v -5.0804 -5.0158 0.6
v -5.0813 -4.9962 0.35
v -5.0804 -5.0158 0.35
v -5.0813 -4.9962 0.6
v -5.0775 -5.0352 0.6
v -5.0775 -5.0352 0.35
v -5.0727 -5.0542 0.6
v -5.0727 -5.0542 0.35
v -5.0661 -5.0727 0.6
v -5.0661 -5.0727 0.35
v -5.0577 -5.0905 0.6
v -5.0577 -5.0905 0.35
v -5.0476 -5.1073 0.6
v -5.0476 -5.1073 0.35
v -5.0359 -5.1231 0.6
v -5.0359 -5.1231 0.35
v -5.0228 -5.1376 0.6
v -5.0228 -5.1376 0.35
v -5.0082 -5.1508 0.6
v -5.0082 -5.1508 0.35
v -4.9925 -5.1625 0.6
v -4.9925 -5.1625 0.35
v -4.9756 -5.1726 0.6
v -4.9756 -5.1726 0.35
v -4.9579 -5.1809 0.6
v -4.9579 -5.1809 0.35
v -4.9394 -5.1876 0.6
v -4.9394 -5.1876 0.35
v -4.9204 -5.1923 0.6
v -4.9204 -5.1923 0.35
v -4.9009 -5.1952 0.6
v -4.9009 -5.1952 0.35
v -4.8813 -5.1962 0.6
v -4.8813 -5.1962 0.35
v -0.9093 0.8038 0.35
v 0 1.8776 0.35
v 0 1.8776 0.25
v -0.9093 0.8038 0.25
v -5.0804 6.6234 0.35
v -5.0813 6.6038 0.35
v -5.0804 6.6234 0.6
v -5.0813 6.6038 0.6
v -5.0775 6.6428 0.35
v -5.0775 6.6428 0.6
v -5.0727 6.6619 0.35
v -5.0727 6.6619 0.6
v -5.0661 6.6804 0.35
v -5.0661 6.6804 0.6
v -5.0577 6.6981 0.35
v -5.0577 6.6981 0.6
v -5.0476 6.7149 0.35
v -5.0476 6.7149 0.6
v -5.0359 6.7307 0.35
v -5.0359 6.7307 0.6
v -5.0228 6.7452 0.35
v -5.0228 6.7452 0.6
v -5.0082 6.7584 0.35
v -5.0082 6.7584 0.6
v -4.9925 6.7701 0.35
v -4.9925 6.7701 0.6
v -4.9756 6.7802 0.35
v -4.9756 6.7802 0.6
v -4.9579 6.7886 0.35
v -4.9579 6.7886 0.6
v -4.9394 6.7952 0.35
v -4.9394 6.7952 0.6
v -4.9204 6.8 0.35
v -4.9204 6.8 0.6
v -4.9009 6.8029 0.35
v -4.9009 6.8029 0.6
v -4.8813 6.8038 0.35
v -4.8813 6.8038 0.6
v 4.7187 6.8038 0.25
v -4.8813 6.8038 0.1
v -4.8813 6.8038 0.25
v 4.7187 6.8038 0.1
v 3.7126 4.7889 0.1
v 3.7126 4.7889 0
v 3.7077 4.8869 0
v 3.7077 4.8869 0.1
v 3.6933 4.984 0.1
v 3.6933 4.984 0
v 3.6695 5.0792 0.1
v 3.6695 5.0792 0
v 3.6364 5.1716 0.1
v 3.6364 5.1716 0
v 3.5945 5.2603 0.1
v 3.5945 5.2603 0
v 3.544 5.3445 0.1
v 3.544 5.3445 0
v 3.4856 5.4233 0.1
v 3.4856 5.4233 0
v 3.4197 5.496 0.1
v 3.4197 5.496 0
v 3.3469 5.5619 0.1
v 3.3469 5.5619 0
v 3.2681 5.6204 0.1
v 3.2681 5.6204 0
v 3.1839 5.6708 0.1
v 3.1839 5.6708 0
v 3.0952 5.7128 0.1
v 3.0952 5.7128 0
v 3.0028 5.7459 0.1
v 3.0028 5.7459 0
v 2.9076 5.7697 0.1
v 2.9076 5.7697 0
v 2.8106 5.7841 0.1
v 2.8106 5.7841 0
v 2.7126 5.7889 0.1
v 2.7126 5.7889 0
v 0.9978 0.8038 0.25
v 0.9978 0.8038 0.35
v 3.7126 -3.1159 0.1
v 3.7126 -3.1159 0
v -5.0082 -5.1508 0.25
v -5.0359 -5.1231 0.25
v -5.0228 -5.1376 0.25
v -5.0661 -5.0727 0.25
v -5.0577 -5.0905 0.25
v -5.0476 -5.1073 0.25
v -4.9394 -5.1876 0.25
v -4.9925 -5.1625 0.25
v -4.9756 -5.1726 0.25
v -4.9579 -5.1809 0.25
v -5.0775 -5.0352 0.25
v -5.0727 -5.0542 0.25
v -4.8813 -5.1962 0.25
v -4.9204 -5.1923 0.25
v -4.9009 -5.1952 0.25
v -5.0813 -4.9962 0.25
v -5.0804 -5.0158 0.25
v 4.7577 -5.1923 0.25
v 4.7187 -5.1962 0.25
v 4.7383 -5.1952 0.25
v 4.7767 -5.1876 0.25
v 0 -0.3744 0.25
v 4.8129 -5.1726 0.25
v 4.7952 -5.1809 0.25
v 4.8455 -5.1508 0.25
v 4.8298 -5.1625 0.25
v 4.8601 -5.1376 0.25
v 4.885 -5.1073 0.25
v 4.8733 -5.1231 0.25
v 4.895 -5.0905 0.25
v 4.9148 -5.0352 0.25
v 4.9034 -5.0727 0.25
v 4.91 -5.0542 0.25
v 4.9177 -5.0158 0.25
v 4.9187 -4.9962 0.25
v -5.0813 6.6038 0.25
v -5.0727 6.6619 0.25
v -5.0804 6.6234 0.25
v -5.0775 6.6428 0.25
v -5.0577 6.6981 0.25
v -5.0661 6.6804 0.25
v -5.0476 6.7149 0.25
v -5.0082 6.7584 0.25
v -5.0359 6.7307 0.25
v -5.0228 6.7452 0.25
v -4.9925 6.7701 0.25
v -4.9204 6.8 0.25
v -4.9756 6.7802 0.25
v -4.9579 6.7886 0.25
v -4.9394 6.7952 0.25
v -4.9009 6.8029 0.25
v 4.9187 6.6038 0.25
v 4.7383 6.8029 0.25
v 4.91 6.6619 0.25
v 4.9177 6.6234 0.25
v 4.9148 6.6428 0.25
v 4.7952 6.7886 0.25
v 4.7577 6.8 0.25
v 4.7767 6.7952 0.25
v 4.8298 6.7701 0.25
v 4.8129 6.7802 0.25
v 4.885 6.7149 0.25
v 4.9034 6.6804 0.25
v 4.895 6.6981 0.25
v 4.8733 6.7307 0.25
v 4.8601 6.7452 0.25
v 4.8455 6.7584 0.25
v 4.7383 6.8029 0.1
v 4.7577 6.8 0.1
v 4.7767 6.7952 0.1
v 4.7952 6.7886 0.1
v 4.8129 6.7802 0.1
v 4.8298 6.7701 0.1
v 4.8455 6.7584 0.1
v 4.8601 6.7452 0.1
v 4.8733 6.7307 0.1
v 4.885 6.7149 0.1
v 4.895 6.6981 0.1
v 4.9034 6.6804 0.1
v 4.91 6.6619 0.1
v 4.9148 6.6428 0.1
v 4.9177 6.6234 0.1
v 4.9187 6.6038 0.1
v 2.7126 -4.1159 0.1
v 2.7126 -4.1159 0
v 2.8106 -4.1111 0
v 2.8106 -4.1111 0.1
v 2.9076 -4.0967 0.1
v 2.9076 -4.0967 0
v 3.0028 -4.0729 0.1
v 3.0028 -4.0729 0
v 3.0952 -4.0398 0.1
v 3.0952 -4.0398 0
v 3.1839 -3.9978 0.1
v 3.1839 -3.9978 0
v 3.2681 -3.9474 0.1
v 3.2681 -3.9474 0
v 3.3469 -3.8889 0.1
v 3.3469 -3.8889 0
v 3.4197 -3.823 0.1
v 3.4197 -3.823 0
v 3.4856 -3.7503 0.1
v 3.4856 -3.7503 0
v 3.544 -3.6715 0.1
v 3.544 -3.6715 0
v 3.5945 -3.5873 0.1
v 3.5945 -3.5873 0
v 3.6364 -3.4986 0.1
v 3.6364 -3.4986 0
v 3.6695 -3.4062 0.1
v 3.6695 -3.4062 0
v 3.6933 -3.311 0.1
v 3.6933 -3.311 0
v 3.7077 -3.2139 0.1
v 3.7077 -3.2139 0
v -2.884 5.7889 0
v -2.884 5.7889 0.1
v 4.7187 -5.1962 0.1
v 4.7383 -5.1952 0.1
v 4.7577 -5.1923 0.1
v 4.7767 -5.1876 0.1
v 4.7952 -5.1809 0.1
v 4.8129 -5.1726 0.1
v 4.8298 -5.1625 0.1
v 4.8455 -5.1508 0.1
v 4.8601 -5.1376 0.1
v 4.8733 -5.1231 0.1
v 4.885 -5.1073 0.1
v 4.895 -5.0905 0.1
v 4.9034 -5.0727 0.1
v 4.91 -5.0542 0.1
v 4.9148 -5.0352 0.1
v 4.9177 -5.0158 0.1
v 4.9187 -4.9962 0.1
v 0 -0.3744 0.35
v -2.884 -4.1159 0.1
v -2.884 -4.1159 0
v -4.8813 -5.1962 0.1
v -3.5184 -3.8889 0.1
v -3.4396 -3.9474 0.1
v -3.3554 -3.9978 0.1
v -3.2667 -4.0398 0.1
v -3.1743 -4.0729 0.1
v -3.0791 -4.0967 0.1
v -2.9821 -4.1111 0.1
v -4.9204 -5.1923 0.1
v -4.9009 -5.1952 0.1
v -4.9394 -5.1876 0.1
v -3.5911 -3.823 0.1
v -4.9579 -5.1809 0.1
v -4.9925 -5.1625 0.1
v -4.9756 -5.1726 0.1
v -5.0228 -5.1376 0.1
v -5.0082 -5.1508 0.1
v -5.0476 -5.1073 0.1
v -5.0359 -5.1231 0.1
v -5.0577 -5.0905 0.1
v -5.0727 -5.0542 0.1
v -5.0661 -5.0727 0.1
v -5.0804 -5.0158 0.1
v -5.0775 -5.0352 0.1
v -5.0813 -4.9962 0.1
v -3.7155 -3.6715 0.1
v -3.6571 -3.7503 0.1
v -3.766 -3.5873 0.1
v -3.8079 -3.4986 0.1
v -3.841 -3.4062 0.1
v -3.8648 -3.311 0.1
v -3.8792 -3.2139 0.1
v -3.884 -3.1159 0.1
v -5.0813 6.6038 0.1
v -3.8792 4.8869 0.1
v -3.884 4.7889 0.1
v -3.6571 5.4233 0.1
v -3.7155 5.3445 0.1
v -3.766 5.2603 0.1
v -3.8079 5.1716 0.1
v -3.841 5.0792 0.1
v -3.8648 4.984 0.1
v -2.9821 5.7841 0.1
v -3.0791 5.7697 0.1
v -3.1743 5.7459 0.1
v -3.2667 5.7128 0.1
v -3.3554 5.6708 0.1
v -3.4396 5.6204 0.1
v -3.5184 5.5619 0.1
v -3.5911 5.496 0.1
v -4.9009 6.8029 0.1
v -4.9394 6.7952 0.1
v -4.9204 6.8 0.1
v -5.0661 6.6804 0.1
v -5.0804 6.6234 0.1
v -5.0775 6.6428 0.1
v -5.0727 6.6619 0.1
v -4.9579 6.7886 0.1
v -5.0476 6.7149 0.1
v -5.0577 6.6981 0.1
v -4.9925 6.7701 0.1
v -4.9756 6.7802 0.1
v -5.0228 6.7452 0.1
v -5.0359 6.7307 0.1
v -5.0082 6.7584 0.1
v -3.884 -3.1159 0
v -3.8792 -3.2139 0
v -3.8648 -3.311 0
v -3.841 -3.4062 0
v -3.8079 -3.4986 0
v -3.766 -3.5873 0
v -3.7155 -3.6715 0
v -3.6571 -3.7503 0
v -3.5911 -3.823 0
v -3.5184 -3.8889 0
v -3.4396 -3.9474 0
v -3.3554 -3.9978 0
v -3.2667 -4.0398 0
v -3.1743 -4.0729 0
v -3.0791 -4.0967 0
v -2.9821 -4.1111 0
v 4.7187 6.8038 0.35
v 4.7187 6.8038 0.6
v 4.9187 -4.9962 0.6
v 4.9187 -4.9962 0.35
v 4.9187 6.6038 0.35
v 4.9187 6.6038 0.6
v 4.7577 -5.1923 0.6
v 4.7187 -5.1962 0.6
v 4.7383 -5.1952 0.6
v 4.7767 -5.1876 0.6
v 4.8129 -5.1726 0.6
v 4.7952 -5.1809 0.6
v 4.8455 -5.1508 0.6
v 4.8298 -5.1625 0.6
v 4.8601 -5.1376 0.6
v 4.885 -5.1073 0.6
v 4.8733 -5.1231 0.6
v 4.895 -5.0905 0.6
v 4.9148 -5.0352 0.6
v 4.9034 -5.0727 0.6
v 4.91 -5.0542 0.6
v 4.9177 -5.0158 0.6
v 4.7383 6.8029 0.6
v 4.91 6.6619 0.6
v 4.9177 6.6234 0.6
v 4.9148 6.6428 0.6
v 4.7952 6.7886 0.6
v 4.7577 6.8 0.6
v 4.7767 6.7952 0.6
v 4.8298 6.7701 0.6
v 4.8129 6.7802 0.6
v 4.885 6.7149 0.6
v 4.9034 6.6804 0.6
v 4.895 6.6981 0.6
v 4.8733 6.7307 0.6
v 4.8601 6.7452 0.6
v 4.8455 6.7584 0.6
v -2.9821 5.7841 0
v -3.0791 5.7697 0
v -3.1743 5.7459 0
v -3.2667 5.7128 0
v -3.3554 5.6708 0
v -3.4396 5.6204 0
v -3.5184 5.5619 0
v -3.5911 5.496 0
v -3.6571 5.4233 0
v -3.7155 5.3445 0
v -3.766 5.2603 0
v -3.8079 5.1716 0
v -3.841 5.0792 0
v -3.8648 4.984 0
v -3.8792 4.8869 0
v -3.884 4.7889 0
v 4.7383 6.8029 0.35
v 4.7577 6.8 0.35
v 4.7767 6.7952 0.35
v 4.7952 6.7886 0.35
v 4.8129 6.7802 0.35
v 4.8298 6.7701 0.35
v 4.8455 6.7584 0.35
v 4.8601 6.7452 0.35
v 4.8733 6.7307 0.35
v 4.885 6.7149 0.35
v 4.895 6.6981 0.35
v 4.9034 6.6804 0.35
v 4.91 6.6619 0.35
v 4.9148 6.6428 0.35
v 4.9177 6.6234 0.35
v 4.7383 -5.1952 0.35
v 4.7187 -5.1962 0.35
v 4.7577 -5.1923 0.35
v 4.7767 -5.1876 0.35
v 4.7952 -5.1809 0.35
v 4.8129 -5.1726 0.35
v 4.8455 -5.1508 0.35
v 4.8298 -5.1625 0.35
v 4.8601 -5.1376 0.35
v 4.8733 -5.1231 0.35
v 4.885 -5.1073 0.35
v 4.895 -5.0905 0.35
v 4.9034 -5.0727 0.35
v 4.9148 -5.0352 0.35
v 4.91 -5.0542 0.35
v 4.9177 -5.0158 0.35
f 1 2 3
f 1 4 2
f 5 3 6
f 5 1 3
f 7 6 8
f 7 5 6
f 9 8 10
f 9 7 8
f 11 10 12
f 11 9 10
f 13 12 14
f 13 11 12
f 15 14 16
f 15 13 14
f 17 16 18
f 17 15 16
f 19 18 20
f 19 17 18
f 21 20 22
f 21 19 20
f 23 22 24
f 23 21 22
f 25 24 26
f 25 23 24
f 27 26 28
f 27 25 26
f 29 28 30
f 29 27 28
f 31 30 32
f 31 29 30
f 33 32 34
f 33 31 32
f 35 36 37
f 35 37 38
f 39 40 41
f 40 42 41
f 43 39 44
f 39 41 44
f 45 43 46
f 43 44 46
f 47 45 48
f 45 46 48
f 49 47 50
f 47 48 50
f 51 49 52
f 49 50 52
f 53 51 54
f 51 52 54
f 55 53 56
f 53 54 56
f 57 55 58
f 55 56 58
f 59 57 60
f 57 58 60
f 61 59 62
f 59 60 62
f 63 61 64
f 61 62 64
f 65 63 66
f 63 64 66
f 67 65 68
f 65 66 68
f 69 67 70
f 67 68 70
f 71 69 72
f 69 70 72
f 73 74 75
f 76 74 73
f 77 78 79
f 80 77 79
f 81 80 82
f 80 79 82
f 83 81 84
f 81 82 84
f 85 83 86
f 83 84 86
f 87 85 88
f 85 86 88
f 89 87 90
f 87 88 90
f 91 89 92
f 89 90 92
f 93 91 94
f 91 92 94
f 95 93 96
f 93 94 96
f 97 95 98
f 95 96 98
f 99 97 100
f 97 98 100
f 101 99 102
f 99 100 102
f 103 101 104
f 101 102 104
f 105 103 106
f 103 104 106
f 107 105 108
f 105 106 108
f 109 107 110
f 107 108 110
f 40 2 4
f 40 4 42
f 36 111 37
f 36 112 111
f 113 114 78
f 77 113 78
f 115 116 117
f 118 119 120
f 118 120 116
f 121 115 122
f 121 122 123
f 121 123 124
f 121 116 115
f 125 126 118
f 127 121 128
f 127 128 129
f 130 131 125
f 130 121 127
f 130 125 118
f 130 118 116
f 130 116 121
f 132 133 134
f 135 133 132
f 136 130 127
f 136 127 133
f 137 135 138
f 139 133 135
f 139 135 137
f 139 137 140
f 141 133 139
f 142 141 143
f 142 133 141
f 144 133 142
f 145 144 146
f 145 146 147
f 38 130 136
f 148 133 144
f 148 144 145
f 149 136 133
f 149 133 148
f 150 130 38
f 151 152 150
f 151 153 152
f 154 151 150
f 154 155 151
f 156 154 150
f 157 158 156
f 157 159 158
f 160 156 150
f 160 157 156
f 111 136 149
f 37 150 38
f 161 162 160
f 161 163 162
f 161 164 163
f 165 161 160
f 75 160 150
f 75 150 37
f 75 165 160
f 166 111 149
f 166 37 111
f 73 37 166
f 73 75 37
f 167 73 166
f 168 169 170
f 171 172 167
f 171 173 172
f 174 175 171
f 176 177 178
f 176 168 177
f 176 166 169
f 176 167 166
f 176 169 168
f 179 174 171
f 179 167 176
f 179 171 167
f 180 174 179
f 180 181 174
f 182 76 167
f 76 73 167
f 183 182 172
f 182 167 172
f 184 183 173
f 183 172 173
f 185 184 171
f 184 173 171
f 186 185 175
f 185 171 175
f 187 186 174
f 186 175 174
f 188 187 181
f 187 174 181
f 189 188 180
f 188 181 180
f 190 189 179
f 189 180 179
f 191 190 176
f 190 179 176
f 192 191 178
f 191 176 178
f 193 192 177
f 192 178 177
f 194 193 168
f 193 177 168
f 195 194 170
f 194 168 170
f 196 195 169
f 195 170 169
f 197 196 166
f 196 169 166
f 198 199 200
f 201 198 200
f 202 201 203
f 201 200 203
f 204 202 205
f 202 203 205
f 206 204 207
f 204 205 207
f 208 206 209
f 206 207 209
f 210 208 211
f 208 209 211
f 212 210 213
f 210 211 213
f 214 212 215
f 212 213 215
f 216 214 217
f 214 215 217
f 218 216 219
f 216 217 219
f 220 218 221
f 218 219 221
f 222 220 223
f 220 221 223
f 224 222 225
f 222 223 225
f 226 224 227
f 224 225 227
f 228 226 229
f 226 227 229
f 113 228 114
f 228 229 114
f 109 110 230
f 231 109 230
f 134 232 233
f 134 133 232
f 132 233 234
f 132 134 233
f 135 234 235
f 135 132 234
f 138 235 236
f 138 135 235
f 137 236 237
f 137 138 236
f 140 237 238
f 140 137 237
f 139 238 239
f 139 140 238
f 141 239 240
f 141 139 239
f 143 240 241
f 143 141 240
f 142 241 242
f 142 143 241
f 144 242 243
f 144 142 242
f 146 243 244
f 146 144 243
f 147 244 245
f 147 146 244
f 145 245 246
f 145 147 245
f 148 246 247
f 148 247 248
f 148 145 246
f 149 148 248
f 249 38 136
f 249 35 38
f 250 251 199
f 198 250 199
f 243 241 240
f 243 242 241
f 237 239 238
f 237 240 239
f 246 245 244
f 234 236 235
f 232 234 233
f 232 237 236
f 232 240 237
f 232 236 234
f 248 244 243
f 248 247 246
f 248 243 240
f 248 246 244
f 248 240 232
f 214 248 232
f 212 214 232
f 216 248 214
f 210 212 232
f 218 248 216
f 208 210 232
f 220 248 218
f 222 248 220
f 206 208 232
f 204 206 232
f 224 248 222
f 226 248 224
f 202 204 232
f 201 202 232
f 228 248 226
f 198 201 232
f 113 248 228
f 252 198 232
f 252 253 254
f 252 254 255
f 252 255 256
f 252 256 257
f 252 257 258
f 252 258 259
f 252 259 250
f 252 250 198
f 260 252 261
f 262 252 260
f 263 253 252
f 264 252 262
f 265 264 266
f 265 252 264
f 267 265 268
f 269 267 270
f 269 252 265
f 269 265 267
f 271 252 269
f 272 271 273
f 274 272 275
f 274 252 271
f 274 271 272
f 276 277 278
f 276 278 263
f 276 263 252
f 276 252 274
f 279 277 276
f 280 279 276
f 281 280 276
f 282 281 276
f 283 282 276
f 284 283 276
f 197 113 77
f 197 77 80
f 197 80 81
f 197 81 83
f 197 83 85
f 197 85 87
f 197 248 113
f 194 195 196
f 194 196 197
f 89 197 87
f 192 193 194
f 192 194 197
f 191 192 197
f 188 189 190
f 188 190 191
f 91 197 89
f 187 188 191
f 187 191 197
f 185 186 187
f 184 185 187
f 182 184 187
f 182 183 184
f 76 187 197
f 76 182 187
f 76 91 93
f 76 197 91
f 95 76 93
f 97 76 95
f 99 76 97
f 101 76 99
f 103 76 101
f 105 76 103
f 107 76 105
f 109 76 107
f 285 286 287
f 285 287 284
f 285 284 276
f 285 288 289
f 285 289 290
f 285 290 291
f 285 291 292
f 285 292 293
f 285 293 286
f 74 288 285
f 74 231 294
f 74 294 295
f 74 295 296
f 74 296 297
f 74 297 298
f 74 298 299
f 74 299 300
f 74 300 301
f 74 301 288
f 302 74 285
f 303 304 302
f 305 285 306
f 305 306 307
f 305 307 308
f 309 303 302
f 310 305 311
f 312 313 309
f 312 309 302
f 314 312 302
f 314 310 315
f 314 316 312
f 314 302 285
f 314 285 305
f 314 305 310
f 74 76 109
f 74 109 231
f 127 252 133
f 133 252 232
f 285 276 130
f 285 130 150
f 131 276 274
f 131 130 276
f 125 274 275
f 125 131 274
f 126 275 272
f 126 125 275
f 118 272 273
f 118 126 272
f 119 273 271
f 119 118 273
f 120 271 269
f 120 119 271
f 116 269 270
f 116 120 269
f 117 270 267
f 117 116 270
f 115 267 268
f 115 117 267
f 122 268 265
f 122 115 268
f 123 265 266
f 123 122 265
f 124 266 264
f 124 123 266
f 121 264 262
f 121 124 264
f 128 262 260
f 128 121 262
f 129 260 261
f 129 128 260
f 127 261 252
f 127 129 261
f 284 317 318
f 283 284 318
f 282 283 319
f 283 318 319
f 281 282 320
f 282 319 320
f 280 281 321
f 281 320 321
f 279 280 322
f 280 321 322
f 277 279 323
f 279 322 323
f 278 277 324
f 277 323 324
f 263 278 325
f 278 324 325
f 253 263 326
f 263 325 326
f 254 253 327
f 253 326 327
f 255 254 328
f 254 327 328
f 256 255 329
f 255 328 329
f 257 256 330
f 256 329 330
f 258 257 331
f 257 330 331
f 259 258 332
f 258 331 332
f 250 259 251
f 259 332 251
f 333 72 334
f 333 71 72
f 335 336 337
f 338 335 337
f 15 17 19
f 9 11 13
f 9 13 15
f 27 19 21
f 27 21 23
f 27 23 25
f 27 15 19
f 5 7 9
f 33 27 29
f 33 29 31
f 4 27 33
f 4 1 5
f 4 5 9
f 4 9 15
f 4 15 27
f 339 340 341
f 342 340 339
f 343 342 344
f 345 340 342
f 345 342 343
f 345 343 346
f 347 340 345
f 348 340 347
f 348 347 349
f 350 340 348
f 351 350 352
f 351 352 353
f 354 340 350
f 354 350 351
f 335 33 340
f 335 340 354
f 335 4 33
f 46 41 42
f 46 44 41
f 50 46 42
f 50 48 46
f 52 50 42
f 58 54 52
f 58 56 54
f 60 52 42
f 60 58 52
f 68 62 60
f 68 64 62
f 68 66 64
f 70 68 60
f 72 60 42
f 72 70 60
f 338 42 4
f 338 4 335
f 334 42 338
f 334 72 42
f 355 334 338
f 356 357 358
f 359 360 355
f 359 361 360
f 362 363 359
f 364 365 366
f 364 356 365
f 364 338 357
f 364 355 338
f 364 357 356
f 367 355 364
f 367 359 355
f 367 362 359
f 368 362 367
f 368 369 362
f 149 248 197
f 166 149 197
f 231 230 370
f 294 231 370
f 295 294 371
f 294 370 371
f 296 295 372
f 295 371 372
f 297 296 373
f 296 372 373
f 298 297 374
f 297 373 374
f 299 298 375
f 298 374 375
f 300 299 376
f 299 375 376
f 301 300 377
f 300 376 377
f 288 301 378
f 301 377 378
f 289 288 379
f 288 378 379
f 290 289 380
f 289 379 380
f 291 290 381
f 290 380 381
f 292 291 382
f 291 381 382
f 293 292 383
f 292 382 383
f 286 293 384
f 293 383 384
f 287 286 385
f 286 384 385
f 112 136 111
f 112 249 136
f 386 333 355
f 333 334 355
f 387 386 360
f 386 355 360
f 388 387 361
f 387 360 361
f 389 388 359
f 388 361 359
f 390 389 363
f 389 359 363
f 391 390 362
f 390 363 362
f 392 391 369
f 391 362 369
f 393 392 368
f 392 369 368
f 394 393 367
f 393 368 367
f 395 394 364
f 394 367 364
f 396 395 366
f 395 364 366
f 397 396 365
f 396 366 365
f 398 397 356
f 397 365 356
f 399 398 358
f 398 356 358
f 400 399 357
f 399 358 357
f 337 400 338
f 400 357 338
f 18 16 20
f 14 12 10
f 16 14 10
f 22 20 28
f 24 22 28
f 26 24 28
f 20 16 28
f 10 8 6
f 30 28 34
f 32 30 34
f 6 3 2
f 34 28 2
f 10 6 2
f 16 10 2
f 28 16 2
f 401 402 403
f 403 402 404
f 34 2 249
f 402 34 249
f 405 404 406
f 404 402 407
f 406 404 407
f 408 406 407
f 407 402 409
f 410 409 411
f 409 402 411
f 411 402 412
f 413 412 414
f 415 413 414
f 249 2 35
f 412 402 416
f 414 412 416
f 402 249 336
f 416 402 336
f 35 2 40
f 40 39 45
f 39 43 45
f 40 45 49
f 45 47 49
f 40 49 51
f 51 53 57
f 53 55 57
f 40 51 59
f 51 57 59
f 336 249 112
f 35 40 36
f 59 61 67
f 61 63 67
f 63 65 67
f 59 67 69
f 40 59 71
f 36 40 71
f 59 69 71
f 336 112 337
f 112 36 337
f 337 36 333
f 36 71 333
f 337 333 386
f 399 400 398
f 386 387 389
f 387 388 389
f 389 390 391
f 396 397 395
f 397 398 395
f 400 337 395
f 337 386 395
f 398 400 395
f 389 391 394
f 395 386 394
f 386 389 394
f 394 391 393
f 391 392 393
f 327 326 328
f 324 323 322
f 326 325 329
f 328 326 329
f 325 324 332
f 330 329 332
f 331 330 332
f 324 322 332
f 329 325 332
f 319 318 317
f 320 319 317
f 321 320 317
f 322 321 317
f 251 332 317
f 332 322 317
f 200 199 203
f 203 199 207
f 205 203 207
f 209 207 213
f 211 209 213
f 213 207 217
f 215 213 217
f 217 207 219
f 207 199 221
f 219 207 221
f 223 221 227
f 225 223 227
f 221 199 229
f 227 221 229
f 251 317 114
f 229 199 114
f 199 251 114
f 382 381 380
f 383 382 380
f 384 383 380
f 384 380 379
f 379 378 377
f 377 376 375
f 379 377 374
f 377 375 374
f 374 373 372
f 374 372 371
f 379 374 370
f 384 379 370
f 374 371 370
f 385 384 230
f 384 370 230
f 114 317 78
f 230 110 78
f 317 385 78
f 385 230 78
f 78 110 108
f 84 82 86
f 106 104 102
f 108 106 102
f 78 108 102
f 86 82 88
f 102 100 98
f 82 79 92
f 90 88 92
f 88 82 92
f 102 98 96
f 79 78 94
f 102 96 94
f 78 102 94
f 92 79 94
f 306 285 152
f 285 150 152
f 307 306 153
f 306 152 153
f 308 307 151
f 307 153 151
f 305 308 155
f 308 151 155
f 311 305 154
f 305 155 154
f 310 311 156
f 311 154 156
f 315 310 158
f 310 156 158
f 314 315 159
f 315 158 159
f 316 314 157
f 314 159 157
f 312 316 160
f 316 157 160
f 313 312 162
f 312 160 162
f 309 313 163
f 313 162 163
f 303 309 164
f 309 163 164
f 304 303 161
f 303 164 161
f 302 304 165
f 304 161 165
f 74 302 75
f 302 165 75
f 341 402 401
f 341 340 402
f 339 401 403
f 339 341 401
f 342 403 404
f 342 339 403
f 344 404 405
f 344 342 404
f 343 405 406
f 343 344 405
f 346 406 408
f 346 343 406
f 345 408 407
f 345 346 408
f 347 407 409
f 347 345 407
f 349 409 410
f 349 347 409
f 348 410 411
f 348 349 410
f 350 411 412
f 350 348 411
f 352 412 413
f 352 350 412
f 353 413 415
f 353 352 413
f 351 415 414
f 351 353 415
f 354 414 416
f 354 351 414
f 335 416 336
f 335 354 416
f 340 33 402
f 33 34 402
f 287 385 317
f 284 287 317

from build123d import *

# Parameters (mm, degrees)
SKETCH_1_W          = 10
SKETCH_1_H          = 12
EXTRUDE_1_DEPTH     = 0.6
SKETCH_2_W          = 10
SKETCH_2_H          = 12
CUT_EXTRUDE_1_DEPTH = 0.1
SKETCH_4_W          = 10
SKETCH_4_H          = 12
CUT_EXTRUDE_3_DEPTH = 0.05
FILLET_1_R          = 0.2


with BuildPart() as part:
    # 草图1 → 凸台-拉伸1 (new body)
    with BuildSketch(Plane.XY):
        with Locations((-0.081339713, 0.803827751)):
            Rectangle(SKETCH_1_W, SKETCH_1_H)
    extrude(amount=EXTRUDE_1_DEPTH)

    # 草图2 → 切除-拉伸1 (cut)
    with BuildSketch(Plane(origin=(0, 0, 0), x_dir=(-1, 0, 0), z_dir=(0, 0, -1))):
        with Locations((0.081339713, 0.803827751)):
            Rectangle(SKETCH_2_W, SKETCH_2_H)
        with BuildLine():
            Line((-2.712551899, 5.7889264), (2.884041266, 5.7889264))
            ThreePointArc((2.884041266, 5.7889264), (3.591148047, 5.496033181), (3.884041266, 4.7889264))
            Line((3.884041266, 4.7889264), (3.884041266, -3.115928634))
            ThreePointArc((3.884041266, -3.115928634), (3.591148047, -3.823035415), (2.884041266, -4.115928634))
            Line((2.884041266, -4.115928634), (-2.712551899, -4.115928634))
            ThreePointArc((-2.712551899, -4.115928634), (-3.419658681, -3.823035415), (-3.712551899, -3.115928634))
            Line((-3.712551899, -3.115928634), (-3.712551899, 4.7889264))
            ThreePointArc((-3.712551899, 4.7889264), (-3.419658681, 5.496033181), (-2.712551899, 5.7889264))
        make_face(mode=Mode.SUBTRACT)
    extrude(amount=-CUT_EXTRUDE_1_DEPTH, mode=Mode.SUBTRACT)

    # 草图4 → 切除-拉伸3 (cut, symmetric)
    with BuildSketch(Plane.XY.offset(0.3)):
        with Locations((-0.081339713, 0.803827751)):
            Rectangle(SKETCH_4_W, SKETCH_4_H)
        Polygon((0, 1.877578929), (-0.909343659, 0.803827751), (0, -0.374397758), (0.997821393, 0.803827751), align=None, mode=Mode.SUBTRACT)
    extrude(amount=CUT_EXTRUDE_3_DEPTH, both=True, mode=Mode.SUBTRACT)

    # 圆角1
    fillet_1_edges = [part.edges().sort_by_distance(p)[0] for p in [
        (-5.081339713, 6.803827751, 0.175),
        (4.918660287, 6.803827751, 0.175),
        (4.918660287, -5.196172249, 0.175),
        (-5.081339713, -5.196172249, 0.175),
        (-5.081339713, 6.803827751, 0.475),
        (4.918660287, 6.803827751, 0.475),
        (4.918660287, -5.196172249, 0.475),
        (-5.081339713, -5.196172249, 0.475),
    ]]
    fillet(fillet_1_edges, radius=FILLET_1_R)


solid = part.part
